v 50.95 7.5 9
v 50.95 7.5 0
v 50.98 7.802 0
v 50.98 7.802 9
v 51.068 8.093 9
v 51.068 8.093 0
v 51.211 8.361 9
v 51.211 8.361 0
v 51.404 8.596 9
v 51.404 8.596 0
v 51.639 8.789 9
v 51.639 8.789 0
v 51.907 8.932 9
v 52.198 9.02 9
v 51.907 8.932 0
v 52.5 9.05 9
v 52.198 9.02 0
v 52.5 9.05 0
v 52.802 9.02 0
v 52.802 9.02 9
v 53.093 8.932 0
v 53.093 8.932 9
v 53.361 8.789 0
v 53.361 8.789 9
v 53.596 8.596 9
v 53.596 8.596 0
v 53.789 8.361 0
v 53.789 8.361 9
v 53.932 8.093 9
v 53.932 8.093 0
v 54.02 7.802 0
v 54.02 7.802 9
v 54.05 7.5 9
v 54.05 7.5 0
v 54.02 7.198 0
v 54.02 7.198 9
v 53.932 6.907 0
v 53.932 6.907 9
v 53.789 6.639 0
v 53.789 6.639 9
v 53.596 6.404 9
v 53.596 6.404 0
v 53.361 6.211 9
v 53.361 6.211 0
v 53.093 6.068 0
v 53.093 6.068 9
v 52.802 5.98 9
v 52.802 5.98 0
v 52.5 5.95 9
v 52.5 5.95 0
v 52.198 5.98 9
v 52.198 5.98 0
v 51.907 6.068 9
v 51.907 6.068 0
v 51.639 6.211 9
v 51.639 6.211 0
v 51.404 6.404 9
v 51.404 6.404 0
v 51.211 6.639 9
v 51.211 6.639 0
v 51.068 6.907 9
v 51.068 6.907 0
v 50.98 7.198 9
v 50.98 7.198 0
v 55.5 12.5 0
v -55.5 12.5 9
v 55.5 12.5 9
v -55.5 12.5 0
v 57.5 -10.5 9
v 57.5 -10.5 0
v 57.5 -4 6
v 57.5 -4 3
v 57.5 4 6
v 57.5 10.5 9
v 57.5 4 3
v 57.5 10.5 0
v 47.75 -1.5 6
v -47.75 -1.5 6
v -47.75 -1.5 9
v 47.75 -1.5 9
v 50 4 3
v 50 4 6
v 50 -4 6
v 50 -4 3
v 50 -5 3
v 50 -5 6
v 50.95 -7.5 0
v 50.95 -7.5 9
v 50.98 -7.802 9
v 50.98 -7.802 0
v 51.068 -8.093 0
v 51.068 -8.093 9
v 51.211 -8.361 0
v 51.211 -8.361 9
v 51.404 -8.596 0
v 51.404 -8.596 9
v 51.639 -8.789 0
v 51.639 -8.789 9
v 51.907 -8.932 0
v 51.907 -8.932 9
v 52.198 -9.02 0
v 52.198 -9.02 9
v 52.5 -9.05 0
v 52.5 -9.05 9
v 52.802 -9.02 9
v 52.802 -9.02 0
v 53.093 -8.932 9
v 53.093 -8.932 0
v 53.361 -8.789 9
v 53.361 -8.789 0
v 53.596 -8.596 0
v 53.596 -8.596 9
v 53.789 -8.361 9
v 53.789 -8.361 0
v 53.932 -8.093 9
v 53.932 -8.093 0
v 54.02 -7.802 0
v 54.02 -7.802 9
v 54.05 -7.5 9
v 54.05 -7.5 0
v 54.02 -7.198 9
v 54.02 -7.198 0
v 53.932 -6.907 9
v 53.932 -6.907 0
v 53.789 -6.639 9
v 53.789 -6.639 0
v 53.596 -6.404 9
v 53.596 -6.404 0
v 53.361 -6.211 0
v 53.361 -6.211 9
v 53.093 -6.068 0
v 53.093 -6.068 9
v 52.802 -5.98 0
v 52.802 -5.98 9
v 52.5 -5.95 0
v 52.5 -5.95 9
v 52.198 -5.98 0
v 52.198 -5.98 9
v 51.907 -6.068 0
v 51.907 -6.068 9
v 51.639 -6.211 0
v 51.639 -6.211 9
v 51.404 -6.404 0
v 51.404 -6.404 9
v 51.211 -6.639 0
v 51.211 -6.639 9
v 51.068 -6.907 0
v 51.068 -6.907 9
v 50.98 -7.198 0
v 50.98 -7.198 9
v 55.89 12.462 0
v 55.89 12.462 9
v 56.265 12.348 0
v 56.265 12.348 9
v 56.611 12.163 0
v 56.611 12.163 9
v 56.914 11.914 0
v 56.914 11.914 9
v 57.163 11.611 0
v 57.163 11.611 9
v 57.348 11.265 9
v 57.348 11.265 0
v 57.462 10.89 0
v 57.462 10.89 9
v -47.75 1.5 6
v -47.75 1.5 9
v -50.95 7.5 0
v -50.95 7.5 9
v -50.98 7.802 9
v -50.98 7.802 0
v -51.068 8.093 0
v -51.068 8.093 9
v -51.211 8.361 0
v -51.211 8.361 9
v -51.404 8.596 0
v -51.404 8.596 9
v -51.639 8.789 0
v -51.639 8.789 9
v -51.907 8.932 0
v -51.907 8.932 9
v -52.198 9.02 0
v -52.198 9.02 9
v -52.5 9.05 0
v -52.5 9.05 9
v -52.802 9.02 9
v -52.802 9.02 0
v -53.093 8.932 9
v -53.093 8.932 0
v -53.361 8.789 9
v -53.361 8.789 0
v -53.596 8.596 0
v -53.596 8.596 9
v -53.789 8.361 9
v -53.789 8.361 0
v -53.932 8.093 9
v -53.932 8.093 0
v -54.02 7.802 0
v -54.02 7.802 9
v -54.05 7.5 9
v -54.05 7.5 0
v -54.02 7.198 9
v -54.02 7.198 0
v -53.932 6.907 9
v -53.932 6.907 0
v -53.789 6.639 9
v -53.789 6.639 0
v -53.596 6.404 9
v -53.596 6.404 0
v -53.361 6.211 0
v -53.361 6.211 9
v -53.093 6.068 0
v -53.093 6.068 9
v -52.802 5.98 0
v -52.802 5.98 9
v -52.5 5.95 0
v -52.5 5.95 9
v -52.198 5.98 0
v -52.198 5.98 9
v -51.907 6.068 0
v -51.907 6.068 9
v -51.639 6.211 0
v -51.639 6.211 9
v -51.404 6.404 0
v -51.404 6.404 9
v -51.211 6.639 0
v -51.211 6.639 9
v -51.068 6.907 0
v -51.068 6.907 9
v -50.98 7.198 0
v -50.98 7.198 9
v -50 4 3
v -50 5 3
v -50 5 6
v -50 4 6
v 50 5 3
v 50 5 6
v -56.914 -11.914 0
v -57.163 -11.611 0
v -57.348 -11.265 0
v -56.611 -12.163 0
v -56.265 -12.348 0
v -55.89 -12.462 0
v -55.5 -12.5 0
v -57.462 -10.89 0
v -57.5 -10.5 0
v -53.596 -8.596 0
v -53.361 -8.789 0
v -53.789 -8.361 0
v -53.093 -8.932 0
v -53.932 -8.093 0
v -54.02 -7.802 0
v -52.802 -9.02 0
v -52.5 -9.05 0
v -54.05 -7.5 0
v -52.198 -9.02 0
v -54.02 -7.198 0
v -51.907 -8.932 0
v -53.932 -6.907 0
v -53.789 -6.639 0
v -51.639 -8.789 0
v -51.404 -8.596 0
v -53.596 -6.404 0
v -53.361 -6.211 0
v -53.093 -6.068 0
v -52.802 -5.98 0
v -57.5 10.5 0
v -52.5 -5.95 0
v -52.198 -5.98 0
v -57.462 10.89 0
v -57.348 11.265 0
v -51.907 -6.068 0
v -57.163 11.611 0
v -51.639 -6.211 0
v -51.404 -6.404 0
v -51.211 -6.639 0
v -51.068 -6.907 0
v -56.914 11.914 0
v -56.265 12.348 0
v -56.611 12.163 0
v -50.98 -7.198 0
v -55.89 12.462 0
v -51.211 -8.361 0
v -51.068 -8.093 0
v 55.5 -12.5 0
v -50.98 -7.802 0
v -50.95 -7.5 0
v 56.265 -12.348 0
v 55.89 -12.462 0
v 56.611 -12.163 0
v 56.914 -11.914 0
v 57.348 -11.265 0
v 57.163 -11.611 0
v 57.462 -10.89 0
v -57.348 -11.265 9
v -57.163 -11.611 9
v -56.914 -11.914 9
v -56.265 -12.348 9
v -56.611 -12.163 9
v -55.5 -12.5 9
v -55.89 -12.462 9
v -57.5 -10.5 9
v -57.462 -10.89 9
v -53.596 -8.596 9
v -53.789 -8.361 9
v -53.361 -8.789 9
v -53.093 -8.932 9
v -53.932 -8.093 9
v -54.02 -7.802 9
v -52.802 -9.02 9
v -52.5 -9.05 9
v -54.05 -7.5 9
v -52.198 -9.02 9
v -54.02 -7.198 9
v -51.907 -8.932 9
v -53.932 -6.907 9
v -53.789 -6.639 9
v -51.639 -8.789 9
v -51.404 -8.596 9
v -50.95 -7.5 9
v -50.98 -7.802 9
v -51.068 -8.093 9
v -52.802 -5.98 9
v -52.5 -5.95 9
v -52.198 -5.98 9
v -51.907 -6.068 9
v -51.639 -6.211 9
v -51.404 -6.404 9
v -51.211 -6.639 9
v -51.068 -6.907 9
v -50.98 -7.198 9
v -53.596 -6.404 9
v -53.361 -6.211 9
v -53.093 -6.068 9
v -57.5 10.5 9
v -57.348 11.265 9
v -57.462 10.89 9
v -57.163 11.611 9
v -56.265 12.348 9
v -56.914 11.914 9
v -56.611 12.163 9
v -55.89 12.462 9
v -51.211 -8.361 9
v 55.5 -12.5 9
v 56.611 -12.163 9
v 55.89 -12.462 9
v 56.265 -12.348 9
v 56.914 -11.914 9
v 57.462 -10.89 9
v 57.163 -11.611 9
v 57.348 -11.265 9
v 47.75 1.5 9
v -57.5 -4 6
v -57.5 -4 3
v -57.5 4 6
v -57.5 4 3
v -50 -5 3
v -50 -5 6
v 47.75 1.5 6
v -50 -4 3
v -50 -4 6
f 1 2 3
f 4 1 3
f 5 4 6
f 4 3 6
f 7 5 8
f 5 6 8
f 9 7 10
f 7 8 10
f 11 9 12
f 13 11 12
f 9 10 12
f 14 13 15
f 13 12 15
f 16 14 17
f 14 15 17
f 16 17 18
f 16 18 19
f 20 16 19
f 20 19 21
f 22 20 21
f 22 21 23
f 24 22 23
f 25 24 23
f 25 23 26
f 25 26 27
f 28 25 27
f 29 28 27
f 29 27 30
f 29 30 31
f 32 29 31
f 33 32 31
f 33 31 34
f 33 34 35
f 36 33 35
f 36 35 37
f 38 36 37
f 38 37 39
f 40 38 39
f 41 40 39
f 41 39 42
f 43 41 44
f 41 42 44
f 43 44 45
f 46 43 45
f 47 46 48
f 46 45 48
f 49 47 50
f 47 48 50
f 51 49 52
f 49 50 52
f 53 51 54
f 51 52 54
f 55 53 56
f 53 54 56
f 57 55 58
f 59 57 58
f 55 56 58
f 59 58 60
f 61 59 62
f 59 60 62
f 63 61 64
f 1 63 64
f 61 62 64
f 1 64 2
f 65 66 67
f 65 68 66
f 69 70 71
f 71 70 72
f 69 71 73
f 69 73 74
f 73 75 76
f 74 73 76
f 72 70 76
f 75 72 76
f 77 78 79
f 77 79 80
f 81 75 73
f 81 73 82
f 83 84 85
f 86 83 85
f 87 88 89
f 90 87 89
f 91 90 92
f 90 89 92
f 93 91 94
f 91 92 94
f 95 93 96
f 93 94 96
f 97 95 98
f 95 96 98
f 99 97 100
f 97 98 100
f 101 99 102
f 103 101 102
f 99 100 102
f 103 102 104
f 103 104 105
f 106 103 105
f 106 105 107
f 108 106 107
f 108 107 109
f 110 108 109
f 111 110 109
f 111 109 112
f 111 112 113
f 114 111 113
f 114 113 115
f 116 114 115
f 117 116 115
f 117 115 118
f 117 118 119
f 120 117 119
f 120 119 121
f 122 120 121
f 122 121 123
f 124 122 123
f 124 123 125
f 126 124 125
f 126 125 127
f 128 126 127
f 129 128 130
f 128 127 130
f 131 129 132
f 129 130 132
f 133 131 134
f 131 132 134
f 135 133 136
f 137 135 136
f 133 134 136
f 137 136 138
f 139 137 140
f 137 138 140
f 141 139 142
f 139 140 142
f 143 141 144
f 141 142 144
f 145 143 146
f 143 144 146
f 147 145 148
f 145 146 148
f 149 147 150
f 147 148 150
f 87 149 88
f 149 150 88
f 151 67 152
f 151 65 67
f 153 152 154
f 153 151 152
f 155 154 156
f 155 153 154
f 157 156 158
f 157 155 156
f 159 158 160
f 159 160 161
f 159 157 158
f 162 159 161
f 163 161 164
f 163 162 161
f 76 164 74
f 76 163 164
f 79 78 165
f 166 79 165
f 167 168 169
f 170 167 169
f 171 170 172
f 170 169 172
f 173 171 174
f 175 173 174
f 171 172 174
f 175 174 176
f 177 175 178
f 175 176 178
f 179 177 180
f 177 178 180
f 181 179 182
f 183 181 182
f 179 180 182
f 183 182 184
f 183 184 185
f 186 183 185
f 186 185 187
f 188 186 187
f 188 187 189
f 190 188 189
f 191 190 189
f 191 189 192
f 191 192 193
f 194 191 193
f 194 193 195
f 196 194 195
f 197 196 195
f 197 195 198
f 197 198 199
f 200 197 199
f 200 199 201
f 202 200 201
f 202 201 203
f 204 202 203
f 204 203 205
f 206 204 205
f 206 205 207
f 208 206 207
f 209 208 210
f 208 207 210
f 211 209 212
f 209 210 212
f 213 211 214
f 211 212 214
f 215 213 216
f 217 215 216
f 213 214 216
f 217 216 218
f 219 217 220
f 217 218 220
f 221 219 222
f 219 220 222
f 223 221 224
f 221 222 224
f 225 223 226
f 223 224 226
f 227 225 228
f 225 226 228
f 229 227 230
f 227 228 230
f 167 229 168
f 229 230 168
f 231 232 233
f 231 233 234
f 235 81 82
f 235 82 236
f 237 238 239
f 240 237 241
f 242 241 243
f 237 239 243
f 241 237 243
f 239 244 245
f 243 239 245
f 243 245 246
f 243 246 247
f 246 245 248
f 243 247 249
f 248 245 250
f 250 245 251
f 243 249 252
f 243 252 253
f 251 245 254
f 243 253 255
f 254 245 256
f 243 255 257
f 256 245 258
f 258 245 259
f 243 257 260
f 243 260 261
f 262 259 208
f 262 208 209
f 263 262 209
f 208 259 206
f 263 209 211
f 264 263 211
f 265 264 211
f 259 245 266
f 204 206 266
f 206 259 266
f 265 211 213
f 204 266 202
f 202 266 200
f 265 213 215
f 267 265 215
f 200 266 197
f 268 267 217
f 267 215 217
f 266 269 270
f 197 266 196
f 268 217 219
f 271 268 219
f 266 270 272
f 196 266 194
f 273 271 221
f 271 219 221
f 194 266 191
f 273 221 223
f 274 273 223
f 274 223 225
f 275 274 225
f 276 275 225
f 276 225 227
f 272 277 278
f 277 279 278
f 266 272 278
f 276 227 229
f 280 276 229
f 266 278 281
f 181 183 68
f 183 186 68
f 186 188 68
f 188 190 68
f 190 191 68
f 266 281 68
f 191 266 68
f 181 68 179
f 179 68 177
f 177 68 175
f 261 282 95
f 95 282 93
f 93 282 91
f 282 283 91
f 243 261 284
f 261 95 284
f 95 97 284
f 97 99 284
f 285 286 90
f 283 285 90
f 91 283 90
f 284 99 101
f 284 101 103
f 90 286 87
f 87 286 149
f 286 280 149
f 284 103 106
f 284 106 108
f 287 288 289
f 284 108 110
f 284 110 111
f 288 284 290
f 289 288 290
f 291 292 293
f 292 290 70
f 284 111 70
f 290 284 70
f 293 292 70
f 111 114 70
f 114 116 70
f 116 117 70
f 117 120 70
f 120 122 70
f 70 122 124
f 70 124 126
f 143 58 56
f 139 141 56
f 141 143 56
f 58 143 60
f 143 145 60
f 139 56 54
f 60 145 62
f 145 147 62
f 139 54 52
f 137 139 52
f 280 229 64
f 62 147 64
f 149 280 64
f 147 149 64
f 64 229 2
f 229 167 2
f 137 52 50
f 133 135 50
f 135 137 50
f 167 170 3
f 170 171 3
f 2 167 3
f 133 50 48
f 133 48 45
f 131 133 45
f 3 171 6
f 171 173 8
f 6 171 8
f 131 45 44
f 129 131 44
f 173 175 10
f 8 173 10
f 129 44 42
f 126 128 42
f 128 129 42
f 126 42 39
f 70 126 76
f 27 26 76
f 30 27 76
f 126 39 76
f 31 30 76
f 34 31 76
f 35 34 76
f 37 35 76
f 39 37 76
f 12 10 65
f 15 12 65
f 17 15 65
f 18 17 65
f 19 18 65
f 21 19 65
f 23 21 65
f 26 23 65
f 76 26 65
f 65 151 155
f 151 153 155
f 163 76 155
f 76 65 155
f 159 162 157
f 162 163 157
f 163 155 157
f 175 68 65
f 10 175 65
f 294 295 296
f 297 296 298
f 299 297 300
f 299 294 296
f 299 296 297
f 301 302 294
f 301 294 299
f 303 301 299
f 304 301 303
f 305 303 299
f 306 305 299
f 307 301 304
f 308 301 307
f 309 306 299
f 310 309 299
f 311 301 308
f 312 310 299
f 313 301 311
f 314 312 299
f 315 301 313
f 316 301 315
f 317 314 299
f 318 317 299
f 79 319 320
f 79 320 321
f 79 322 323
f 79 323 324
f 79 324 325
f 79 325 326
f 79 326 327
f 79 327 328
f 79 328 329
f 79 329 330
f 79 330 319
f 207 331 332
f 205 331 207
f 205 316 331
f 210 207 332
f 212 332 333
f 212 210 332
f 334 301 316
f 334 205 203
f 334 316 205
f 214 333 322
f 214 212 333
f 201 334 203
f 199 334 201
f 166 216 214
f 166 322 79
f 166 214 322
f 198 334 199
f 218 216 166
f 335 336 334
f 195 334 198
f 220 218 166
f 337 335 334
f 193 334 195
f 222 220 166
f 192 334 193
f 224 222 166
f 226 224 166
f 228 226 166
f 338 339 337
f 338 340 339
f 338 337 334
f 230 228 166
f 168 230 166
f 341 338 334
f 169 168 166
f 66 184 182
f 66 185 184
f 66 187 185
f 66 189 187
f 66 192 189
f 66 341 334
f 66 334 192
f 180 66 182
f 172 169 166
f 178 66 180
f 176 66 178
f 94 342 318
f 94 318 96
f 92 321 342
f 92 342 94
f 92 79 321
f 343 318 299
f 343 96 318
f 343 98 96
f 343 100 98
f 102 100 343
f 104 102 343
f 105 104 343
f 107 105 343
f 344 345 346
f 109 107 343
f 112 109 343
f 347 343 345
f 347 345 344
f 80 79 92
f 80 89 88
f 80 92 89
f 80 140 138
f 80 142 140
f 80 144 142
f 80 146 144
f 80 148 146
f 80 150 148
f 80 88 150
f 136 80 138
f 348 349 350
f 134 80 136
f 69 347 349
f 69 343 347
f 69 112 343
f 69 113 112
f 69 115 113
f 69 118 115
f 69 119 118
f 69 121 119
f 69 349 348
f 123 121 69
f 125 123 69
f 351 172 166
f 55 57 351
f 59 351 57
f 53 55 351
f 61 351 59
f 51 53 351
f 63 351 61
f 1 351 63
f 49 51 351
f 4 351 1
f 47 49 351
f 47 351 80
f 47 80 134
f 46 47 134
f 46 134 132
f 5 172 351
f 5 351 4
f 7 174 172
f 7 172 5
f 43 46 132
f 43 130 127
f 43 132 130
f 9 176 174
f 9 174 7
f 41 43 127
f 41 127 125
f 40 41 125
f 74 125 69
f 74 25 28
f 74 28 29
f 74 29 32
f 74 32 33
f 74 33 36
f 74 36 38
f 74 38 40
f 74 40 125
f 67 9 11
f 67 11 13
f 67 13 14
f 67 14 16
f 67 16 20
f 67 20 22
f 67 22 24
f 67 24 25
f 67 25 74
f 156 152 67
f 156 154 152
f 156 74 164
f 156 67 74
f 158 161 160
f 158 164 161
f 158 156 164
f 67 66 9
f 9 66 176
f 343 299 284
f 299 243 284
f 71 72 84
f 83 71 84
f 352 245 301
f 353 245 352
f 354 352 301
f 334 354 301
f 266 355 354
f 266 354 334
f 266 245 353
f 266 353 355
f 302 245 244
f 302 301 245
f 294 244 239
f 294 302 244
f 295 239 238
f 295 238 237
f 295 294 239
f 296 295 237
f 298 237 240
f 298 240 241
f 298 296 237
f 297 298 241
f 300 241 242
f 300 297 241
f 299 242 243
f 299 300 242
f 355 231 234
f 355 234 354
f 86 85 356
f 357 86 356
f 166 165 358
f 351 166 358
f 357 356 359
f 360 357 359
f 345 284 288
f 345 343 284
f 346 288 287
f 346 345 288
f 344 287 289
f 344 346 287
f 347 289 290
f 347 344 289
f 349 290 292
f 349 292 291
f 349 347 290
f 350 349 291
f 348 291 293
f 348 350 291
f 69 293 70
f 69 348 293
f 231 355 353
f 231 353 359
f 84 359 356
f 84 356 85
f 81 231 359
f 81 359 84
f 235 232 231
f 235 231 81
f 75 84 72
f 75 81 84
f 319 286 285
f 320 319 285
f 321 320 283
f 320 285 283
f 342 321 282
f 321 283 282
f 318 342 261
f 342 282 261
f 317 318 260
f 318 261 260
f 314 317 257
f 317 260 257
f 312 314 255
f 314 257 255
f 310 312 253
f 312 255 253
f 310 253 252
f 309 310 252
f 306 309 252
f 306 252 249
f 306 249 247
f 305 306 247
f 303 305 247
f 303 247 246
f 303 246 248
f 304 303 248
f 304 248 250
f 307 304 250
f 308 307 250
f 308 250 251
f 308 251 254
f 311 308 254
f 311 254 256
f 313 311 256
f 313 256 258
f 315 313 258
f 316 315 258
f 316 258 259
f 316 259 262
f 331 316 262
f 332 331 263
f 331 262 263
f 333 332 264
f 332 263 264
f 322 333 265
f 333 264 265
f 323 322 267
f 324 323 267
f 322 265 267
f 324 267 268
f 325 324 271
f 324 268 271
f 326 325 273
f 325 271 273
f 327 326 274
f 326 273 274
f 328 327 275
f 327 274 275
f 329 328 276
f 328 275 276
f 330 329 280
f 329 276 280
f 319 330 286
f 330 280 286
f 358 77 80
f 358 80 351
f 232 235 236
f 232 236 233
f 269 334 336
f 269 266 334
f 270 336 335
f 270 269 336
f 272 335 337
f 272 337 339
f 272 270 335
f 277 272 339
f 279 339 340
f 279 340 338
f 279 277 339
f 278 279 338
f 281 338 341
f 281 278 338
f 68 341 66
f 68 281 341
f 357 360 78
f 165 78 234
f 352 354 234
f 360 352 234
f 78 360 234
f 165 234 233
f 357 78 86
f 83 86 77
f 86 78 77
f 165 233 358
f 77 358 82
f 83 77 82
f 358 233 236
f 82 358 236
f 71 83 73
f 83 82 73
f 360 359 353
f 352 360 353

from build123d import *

# Parameters (mm, degrees)
SKETCH_W              = 115
SKETCH_H              = 25
PAD_DEPTH             = 3
PAD001_DEPTH          = 3
SKETCH002_W           = 115
SKETCH002_H           = 25
SKETCH002_W_2         = 95.5
SKETCH002_H_2         = 3
PAD002_DEPTH          = 3
SKETCH003_R           = 1.55
POCKET_DEPTH          = 245.060315
POLARPATTERN_COUNT    = 2
POLARPATTERN001_COUNT = 2
POLARPATTERN002_COUNT = 2
FILLET_R              = 2


with BuildPart() as part:
    # Sketch → Pad (new body)
    with BuildSketch(Plane.XY):
        Rectangle(SKETCH_W, SKETCH_H)
    extrude(amount=PAD_DEPTH)

    # Sketch001 (on Face6 of Pad) → Pad001 (join)
    with BuildSketch(Plane.XY.offset(3)):
        Polygon((-57.5, 12.5), (57.5, 12.5), (57.5, 4), (50, 4), (50, 5), (-50, 5), (-50, 4), (-57.5, 4), align=None)
        Polygon((-57.5, -12.5), (57.5, -12.5), (57.5, -4), (50, -4), (50, -5), (-50, -5), (-50, -4), (-57.5, -4), align=None)
    extrude(amount=PAD001_DEPTH)

    # Sketch002 (on Face12 of Pad001) → Pad002 (join)
    with BuildSketch(Plane.XY.offset(6)):
        Rectangle(SKETCH002_W, SKETCH002_H)
        Rectangle(SKETCH002_W_2, SKETCH002_H_2, mode=Mode.SUBTRACT)
    extrude(amount=PAD002_DEPTH)

    # Sketch003 (on Face26 of Pad002) → Pocket (cut, through all)
    with BuildSketch(Plane.XY.offset(9)):
        with Locations((-52.5, 7.5)):
            Circle(SKETCH003_R)
    pocket = extrude(amount=-POCKET_DEPTH, mode=Mode.SUBTRACT)

    # PolarPattern: Pocket ×2 about axis
    polarpattern_axis = Axis((0, 0, 0), (0, 1, 0))
    for i in range(1, POLARPATTERN_COUNT):
        add(pocket.rotate(polarpattern_axis, i * 360 / POLARPATTERN_COUNT), mode=Mode.SUBTRACT)

    # PolarPattern001: Pocket ×2 about axis
    polarpattern001_axis = Axis((0, 0, 0), (1, 0, 0))
    for i in range(1, POLARPATTERN001_COUNT):
        add(pocket.rotate(polarpattern001_axis, i * 360 / POLARPATTERN001_COUNT), mode=Mode.SUBTRACT)

    # PolarPattern002: Pocket ×2 about axis
    polarpattern002_axis = Axis((0, 0, 9), (0, 0, 1))
    for i in range(1, POLARPATTERN002_COUNT):
        add(pocket.rotate(polarpattern002_axis, i * 360 / POLARPATTERN002_COUNT), mode=Mode.SUBTRACT)

    # Fillet
    fillet_edges = [part.edges().sort_by_distance(p)[0] for p in [
        (57.5, 12.5, 7.5),
        (57.5, 12.5, 4.5),
        (57.5, 12.5, 1.5),
        (57.5, -12.5, 7.5),
        (-57.5, 12.5, 7.5),
        (-57.5, -12.5, 7.5),
    ]]
    fillet(fillet_edges, radius=FILLET_R)


solid = part.part
